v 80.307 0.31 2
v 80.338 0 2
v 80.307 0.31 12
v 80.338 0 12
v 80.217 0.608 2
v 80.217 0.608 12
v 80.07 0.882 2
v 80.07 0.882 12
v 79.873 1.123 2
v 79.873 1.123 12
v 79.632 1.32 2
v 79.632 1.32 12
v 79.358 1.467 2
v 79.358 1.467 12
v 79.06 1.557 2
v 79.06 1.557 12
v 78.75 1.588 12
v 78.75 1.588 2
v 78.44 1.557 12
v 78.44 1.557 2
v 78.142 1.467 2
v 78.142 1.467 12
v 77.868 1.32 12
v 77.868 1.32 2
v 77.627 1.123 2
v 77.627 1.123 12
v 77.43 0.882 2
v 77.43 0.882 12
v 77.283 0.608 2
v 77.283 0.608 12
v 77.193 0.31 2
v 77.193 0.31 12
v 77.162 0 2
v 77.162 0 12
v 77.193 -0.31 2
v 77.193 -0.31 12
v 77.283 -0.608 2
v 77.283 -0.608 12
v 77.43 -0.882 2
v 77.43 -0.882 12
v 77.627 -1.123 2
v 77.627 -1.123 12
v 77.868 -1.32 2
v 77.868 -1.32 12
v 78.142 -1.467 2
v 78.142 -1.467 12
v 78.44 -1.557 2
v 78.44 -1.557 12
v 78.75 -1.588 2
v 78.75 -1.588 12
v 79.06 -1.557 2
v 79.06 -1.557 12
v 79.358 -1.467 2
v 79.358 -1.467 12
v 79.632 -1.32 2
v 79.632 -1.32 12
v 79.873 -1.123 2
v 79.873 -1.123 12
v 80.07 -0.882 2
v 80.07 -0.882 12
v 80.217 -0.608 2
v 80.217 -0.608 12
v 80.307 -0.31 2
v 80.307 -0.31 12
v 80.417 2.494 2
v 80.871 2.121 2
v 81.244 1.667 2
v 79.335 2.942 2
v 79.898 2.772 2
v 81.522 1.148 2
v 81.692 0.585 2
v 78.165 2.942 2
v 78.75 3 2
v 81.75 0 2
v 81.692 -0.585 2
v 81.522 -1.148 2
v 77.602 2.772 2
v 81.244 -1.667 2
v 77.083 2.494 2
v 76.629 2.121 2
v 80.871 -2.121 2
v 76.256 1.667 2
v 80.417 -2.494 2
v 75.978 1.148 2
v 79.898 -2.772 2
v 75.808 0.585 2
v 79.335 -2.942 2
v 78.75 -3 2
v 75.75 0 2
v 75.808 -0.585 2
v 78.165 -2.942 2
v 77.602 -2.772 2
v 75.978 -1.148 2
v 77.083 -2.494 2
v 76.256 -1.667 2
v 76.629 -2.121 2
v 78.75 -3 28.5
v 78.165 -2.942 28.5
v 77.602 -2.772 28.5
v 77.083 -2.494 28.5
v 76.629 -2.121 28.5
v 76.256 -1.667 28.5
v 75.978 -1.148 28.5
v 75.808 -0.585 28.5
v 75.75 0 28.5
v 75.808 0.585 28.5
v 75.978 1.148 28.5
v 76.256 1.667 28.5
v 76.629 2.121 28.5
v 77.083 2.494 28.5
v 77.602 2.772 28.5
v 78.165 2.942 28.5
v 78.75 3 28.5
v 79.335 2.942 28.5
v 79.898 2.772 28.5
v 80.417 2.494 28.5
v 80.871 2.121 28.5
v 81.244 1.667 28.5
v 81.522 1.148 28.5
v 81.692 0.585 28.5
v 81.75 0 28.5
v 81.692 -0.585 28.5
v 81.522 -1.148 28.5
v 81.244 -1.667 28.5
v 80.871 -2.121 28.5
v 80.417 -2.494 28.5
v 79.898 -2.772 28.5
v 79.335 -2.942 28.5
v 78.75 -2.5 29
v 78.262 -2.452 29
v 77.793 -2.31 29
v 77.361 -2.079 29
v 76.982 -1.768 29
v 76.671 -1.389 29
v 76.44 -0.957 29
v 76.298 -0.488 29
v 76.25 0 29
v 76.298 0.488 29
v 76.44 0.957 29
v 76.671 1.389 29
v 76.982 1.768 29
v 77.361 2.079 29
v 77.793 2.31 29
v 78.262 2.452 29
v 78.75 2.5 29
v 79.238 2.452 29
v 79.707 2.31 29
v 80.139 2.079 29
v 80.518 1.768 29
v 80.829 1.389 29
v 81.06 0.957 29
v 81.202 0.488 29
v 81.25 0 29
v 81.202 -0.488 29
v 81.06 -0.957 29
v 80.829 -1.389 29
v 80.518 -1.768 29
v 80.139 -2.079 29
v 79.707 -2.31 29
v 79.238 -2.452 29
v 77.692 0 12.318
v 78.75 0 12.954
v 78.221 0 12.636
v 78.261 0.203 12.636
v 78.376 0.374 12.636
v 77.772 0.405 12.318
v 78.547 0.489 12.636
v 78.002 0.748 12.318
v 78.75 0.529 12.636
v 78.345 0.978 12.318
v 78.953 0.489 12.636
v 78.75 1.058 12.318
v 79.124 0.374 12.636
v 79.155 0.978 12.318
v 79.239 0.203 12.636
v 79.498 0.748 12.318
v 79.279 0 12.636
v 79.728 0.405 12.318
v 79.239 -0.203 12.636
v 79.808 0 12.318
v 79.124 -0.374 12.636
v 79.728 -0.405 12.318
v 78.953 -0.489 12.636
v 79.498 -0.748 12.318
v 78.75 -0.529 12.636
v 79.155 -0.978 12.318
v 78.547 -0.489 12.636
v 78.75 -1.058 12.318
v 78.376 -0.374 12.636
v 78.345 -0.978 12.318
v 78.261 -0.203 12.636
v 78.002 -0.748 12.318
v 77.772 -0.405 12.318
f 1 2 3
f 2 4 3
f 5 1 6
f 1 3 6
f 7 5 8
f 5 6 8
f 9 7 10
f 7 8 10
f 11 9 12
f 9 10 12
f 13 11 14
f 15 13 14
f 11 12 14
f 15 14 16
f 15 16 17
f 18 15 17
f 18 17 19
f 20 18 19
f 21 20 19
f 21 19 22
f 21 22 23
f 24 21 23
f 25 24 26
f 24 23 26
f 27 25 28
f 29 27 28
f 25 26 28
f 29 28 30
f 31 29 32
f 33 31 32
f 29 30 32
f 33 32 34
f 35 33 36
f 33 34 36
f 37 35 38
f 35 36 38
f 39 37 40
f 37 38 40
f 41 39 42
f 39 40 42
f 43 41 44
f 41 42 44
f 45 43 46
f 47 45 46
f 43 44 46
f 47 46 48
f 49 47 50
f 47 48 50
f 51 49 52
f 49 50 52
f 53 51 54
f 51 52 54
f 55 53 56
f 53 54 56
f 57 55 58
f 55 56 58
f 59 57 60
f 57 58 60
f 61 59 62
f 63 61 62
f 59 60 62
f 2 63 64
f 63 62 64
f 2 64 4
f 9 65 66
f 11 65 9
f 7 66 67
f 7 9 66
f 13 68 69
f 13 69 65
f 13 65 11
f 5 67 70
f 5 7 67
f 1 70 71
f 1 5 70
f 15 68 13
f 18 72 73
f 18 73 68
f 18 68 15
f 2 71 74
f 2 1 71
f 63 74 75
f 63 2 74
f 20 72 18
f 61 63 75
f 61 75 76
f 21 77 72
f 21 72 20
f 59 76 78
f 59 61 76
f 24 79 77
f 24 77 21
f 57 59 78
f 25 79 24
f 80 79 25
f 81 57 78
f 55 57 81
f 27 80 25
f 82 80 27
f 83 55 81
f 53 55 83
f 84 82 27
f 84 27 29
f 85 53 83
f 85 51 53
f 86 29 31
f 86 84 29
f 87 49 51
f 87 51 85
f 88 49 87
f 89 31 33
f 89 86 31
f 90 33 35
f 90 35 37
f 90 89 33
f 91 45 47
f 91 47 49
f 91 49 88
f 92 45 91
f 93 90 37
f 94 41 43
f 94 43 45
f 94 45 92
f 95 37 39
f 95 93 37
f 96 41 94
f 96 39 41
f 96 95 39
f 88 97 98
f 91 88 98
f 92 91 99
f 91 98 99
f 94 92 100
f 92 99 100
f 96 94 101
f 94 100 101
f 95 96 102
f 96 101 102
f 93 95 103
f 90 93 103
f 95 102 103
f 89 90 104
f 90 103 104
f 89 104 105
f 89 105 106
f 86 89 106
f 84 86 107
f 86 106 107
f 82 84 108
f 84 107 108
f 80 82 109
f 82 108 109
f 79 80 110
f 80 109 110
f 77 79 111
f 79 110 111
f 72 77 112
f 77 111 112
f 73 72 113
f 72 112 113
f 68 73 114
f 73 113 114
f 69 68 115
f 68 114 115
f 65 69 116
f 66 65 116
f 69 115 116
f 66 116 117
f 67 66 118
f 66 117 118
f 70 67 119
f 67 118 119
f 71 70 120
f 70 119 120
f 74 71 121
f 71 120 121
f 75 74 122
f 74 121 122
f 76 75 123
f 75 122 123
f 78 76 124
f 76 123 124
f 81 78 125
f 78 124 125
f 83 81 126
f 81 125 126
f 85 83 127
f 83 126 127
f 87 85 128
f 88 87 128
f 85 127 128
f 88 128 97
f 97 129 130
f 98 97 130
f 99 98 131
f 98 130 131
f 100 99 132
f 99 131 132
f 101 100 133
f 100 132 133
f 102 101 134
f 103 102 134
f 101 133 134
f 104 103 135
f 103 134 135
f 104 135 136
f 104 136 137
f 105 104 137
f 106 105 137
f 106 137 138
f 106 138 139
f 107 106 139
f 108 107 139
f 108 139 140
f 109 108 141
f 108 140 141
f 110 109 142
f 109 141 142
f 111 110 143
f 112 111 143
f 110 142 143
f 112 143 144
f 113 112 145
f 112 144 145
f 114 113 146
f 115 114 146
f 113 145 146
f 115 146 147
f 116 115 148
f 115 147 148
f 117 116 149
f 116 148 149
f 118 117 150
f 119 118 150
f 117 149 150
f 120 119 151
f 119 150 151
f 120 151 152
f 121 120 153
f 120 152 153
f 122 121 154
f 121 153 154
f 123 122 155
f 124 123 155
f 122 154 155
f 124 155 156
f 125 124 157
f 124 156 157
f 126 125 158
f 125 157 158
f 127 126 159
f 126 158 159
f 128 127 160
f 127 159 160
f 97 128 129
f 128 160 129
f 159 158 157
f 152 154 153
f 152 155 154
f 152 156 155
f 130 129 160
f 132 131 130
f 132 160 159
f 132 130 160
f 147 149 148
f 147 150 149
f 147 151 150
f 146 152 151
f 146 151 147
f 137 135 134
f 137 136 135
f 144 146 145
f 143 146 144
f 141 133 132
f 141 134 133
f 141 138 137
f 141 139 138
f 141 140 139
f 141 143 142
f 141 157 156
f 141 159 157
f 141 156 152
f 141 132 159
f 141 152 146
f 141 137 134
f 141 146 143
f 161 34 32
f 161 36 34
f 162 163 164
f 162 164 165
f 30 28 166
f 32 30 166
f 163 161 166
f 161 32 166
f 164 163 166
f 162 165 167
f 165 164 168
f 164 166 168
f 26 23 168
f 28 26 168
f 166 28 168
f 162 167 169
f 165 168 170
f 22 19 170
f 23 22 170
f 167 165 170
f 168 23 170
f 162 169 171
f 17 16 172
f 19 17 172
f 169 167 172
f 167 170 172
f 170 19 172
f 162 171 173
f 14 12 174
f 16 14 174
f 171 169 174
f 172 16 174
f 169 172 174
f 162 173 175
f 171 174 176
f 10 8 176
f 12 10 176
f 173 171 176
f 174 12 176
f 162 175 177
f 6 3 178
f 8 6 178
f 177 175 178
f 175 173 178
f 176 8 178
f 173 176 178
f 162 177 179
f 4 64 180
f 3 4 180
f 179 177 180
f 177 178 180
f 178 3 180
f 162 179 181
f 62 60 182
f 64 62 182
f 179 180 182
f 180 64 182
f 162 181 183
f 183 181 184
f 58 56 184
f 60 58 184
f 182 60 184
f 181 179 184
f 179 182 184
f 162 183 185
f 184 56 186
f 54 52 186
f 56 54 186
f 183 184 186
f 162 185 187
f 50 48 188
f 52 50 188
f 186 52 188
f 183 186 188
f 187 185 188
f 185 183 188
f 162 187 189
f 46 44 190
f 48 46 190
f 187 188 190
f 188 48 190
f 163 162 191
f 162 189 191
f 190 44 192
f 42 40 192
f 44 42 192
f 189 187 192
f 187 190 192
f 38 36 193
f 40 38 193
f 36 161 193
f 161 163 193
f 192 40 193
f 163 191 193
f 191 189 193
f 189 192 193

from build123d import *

# Parameters (mm, degrees)
F_3_1_3_175_DURCHMESSER_BOHRUNG1_D     = 3.175
F_3_1_3_175_DURCHMESSER_BOHRUNG1_DEPTH = 10
F_3_1_3_175_DURCHMESSER_BOHRUNG1_TIP   = 0.953866233
FASE1_SIZE                             = 0.5


with BuildPart() as part:
    # Skizze1 → Rotation1 (revolve)
    with BuildSketch(Plane(origin=(78.75, 0, 0), x_dir=(0, 0, -1), z_dir=(1, 0, 0)), mode=Mode.PRIVATE) as rotation1_sk:
        Polygon((-2, 3), (-2, 0), (-22, 0), (-29, 0), (-29, 3), (-22, 3), align=None)
    revolve(rotation1_sk.sketch.rotate(Axis((78.75, 0, 22), (0, 0, -1)), 180), axis=Axis((78.75, 0, 22), (0, 0, -1)))

    # Ø3.1 (3.175) Durchmesser Bohrung1
    with Locations(Plane(origin=(0, 0, 2), x_dir=(-1, 0, 0), z_dir=(0, 0, -1))):
        with Locations((-78.75, 0)):
            Hole(F_3_1_3_175_DURCHMESSER_BOHRUNG1_D / 2, depth=F_3_1_3_175_DURCHMESSER_BOHRUNG1_DEPTH)
            with Locations((0, 0, -(F_3_1_3_175_DURCHMESSER_BOHRUNG1_DEPTH + F_3_1_3_175_DURCHMESSER_BOHRUNG1_TIP / 2))):  # 118° drill point
                Cone(0, F_3_1_3_175_DURCHMESSER_BOHRUNG1_D / 2, F_3_1_3_175_DURCHMESSER_BOHRUNG1_TIP, mode=Mode.SUBTRACT)

    # Fase1
    fase1_edges = [part.edges().sort_by_distance(p)[0] for p in [
        (78.75, 3, 29),
    ]]
    chamfer(fase1_edges, length=FASE1_SIZE)


solid = part.part
